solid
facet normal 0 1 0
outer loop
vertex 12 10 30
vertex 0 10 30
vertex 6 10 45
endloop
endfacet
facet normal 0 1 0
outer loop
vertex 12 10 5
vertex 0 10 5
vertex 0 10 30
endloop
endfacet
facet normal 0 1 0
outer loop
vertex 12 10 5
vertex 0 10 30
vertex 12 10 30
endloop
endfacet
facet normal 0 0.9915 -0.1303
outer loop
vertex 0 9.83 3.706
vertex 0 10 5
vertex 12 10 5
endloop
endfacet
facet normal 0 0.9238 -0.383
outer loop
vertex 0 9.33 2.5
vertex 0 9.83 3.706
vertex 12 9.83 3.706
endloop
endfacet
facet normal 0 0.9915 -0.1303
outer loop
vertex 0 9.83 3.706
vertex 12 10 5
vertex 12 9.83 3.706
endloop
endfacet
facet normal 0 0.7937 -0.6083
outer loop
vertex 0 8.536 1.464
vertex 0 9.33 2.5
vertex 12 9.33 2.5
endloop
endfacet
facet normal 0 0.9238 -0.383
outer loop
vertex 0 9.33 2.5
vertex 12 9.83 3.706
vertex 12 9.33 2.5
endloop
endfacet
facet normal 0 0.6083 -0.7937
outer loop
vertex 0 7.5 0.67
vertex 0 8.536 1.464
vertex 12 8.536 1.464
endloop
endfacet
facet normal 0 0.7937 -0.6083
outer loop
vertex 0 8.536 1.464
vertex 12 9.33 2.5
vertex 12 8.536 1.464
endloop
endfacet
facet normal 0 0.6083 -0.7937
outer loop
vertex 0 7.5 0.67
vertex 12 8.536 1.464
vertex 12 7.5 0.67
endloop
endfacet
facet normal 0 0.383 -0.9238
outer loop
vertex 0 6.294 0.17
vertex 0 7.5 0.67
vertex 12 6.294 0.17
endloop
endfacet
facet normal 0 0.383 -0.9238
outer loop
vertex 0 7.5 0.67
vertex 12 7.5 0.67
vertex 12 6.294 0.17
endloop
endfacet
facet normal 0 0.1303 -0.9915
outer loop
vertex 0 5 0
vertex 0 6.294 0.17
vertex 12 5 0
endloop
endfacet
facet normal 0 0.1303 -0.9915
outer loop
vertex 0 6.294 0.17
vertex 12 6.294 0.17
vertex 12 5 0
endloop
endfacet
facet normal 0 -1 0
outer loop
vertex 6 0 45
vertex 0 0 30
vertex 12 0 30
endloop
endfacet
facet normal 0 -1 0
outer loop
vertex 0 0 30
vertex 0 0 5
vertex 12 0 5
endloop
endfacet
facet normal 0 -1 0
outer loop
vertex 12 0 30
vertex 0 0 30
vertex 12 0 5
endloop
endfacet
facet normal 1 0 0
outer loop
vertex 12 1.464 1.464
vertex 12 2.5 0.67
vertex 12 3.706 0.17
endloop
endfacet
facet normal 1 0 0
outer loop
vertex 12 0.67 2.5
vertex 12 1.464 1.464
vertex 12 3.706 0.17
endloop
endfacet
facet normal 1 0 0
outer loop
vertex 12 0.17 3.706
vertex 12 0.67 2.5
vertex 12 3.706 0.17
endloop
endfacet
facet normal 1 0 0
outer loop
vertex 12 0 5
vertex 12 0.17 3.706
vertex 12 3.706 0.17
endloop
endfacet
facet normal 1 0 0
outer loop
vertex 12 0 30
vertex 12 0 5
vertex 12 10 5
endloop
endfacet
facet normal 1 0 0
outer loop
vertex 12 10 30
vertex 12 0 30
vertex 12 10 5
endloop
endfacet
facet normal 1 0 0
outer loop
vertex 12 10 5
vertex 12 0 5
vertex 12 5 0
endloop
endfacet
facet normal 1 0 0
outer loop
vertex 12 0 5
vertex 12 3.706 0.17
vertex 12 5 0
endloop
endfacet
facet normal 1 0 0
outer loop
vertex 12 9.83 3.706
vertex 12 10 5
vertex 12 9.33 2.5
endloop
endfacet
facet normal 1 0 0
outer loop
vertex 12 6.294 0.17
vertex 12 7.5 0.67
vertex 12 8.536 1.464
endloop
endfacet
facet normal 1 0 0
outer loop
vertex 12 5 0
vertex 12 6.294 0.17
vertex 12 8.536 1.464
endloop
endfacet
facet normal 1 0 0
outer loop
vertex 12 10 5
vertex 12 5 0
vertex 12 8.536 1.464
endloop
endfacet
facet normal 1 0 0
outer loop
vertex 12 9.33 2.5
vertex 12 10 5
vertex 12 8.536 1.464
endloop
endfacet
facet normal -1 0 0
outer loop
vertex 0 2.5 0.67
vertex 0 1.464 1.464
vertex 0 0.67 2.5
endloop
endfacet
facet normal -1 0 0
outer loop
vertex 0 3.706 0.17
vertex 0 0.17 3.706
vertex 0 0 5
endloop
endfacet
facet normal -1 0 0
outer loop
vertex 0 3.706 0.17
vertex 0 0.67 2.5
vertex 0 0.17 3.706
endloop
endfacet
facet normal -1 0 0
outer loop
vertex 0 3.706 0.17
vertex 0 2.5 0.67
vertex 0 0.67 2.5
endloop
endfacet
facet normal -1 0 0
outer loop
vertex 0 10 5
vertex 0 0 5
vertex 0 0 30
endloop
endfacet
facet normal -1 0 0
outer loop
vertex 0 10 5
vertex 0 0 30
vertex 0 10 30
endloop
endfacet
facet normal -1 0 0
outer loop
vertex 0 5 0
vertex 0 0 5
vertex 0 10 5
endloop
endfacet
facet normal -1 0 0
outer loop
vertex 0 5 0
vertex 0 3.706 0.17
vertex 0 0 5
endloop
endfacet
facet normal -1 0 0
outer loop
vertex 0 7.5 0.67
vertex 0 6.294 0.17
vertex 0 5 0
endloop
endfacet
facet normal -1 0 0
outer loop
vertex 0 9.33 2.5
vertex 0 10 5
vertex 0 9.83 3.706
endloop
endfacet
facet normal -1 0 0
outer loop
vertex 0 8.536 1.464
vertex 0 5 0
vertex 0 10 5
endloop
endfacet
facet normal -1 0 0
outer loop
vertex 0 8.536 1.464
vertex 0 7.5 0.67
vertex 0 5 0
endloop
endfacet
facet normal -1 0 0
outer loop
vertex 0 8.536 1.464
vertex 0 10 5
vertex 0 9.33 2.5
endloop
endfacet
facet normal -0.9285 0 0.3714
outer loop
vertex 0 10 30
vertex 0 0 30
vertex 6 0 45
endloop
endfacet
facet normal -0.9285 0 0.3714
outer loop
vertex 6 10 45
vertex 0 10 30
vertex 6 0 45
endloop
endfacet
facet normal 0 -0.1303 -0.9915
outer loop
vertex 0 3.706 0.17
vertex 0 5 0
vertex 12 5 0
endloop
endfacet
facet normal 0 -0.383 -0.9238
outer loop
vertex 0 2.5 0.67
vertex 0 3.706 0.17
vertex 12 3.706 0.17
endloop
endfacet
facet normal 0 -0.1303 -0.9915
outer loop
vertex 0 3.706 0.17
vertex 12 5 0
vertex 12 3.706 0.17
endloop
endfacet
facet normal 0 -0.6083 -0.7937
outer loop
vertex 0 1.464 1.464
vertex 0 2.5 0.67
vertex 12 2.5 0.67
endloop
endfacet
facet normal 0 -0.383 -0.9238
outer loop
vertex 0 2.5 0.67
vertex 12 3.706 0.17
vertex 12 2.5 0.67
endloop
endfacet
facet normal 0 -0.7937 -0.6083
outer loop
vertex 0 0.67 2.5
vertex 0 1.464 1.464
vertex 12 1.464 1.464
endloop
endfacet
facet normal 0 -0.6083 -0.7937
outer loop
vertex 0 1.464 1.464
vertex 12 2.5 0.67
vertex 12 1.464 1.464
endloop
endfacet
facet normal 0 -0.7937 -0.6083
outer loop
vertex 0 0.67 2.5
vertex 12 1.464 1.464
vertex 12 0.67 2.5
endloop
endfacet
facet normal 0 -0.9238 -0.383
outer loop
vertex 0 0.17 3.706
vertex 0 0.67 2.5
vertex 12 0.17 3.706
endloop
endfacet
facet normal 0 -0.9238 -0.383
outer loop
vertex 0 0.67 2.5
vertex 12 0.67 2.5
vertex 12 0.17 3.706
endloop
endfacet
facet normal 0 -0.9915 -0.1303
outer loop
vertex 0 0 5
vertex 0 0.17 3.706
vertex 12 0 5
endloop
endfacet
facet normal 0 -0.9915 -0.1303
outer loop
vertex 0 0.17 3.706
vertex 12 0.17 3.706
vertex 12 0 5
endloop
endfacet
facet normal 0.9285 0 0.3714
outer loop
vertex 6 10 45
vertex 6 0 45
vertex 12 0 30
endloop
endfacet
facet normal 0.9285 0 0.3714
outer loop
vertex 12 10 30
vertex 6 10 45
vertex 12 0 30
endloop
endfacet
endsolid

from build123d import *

# Parameters (mm, degrees)
SKETCH_2_W          = 12
SKETCH_2_H          = 10
EXTRUDE_1_DEPTH     = 45
CUT_EXTRUDE_1_DEPTH = 65
CUT_EXTRUDE_2_DEPTH = 65


with BuildPart() as part:
    # 草图2 → 凸台-拉伸1 (new body)
    with BuildSketch(Plane.XY):
        with Locations((6, 5)):
            Rectangle(SKETCH_2_W, SKETCH_2_H)
    extrude(amount=EXTRUDE_1_DEPTH)

    # 草图3 → 切除-拉伸1 (cut)
    with BuildSketch(Plane(origin=(12, 0, 0), x_dir=(0, 0, -1), z_dir=(1, 0, 0))):
        with BuildLine():
            Line((0, 0), (0, 5))
            ThreePointArc((0, 5), (-1.464466094, 1.464466094), (-5, 0))
            Line((-5, 0), (0, 0))
        make_face()
        with BuildLine():
            Line((0, 10), (-5, 10))
            ThreePointArc((-5, 10), (-1.464466094, 8.535533906), (0, 5))
            Line((0, 5), (0, 10))
        make_face()
    extrude(amount=-CUT_EXTRUDE_1_DEPTH, mode=Mode.SUBTRACT)

    # 草图4 → 切除-拉伸2 (cut)
    with BuildSketch(Plane.XZ):
        Polygon((0, 45), (0, 30), (6, 45), align=None)
        Polygon((12, 45), (6, 45), (12, 30), align=None)
    extrude(amount=-CUT_EXTRUDE_2_DEPTH, mode=Mode.SUBTRACT)


solid = part.part
